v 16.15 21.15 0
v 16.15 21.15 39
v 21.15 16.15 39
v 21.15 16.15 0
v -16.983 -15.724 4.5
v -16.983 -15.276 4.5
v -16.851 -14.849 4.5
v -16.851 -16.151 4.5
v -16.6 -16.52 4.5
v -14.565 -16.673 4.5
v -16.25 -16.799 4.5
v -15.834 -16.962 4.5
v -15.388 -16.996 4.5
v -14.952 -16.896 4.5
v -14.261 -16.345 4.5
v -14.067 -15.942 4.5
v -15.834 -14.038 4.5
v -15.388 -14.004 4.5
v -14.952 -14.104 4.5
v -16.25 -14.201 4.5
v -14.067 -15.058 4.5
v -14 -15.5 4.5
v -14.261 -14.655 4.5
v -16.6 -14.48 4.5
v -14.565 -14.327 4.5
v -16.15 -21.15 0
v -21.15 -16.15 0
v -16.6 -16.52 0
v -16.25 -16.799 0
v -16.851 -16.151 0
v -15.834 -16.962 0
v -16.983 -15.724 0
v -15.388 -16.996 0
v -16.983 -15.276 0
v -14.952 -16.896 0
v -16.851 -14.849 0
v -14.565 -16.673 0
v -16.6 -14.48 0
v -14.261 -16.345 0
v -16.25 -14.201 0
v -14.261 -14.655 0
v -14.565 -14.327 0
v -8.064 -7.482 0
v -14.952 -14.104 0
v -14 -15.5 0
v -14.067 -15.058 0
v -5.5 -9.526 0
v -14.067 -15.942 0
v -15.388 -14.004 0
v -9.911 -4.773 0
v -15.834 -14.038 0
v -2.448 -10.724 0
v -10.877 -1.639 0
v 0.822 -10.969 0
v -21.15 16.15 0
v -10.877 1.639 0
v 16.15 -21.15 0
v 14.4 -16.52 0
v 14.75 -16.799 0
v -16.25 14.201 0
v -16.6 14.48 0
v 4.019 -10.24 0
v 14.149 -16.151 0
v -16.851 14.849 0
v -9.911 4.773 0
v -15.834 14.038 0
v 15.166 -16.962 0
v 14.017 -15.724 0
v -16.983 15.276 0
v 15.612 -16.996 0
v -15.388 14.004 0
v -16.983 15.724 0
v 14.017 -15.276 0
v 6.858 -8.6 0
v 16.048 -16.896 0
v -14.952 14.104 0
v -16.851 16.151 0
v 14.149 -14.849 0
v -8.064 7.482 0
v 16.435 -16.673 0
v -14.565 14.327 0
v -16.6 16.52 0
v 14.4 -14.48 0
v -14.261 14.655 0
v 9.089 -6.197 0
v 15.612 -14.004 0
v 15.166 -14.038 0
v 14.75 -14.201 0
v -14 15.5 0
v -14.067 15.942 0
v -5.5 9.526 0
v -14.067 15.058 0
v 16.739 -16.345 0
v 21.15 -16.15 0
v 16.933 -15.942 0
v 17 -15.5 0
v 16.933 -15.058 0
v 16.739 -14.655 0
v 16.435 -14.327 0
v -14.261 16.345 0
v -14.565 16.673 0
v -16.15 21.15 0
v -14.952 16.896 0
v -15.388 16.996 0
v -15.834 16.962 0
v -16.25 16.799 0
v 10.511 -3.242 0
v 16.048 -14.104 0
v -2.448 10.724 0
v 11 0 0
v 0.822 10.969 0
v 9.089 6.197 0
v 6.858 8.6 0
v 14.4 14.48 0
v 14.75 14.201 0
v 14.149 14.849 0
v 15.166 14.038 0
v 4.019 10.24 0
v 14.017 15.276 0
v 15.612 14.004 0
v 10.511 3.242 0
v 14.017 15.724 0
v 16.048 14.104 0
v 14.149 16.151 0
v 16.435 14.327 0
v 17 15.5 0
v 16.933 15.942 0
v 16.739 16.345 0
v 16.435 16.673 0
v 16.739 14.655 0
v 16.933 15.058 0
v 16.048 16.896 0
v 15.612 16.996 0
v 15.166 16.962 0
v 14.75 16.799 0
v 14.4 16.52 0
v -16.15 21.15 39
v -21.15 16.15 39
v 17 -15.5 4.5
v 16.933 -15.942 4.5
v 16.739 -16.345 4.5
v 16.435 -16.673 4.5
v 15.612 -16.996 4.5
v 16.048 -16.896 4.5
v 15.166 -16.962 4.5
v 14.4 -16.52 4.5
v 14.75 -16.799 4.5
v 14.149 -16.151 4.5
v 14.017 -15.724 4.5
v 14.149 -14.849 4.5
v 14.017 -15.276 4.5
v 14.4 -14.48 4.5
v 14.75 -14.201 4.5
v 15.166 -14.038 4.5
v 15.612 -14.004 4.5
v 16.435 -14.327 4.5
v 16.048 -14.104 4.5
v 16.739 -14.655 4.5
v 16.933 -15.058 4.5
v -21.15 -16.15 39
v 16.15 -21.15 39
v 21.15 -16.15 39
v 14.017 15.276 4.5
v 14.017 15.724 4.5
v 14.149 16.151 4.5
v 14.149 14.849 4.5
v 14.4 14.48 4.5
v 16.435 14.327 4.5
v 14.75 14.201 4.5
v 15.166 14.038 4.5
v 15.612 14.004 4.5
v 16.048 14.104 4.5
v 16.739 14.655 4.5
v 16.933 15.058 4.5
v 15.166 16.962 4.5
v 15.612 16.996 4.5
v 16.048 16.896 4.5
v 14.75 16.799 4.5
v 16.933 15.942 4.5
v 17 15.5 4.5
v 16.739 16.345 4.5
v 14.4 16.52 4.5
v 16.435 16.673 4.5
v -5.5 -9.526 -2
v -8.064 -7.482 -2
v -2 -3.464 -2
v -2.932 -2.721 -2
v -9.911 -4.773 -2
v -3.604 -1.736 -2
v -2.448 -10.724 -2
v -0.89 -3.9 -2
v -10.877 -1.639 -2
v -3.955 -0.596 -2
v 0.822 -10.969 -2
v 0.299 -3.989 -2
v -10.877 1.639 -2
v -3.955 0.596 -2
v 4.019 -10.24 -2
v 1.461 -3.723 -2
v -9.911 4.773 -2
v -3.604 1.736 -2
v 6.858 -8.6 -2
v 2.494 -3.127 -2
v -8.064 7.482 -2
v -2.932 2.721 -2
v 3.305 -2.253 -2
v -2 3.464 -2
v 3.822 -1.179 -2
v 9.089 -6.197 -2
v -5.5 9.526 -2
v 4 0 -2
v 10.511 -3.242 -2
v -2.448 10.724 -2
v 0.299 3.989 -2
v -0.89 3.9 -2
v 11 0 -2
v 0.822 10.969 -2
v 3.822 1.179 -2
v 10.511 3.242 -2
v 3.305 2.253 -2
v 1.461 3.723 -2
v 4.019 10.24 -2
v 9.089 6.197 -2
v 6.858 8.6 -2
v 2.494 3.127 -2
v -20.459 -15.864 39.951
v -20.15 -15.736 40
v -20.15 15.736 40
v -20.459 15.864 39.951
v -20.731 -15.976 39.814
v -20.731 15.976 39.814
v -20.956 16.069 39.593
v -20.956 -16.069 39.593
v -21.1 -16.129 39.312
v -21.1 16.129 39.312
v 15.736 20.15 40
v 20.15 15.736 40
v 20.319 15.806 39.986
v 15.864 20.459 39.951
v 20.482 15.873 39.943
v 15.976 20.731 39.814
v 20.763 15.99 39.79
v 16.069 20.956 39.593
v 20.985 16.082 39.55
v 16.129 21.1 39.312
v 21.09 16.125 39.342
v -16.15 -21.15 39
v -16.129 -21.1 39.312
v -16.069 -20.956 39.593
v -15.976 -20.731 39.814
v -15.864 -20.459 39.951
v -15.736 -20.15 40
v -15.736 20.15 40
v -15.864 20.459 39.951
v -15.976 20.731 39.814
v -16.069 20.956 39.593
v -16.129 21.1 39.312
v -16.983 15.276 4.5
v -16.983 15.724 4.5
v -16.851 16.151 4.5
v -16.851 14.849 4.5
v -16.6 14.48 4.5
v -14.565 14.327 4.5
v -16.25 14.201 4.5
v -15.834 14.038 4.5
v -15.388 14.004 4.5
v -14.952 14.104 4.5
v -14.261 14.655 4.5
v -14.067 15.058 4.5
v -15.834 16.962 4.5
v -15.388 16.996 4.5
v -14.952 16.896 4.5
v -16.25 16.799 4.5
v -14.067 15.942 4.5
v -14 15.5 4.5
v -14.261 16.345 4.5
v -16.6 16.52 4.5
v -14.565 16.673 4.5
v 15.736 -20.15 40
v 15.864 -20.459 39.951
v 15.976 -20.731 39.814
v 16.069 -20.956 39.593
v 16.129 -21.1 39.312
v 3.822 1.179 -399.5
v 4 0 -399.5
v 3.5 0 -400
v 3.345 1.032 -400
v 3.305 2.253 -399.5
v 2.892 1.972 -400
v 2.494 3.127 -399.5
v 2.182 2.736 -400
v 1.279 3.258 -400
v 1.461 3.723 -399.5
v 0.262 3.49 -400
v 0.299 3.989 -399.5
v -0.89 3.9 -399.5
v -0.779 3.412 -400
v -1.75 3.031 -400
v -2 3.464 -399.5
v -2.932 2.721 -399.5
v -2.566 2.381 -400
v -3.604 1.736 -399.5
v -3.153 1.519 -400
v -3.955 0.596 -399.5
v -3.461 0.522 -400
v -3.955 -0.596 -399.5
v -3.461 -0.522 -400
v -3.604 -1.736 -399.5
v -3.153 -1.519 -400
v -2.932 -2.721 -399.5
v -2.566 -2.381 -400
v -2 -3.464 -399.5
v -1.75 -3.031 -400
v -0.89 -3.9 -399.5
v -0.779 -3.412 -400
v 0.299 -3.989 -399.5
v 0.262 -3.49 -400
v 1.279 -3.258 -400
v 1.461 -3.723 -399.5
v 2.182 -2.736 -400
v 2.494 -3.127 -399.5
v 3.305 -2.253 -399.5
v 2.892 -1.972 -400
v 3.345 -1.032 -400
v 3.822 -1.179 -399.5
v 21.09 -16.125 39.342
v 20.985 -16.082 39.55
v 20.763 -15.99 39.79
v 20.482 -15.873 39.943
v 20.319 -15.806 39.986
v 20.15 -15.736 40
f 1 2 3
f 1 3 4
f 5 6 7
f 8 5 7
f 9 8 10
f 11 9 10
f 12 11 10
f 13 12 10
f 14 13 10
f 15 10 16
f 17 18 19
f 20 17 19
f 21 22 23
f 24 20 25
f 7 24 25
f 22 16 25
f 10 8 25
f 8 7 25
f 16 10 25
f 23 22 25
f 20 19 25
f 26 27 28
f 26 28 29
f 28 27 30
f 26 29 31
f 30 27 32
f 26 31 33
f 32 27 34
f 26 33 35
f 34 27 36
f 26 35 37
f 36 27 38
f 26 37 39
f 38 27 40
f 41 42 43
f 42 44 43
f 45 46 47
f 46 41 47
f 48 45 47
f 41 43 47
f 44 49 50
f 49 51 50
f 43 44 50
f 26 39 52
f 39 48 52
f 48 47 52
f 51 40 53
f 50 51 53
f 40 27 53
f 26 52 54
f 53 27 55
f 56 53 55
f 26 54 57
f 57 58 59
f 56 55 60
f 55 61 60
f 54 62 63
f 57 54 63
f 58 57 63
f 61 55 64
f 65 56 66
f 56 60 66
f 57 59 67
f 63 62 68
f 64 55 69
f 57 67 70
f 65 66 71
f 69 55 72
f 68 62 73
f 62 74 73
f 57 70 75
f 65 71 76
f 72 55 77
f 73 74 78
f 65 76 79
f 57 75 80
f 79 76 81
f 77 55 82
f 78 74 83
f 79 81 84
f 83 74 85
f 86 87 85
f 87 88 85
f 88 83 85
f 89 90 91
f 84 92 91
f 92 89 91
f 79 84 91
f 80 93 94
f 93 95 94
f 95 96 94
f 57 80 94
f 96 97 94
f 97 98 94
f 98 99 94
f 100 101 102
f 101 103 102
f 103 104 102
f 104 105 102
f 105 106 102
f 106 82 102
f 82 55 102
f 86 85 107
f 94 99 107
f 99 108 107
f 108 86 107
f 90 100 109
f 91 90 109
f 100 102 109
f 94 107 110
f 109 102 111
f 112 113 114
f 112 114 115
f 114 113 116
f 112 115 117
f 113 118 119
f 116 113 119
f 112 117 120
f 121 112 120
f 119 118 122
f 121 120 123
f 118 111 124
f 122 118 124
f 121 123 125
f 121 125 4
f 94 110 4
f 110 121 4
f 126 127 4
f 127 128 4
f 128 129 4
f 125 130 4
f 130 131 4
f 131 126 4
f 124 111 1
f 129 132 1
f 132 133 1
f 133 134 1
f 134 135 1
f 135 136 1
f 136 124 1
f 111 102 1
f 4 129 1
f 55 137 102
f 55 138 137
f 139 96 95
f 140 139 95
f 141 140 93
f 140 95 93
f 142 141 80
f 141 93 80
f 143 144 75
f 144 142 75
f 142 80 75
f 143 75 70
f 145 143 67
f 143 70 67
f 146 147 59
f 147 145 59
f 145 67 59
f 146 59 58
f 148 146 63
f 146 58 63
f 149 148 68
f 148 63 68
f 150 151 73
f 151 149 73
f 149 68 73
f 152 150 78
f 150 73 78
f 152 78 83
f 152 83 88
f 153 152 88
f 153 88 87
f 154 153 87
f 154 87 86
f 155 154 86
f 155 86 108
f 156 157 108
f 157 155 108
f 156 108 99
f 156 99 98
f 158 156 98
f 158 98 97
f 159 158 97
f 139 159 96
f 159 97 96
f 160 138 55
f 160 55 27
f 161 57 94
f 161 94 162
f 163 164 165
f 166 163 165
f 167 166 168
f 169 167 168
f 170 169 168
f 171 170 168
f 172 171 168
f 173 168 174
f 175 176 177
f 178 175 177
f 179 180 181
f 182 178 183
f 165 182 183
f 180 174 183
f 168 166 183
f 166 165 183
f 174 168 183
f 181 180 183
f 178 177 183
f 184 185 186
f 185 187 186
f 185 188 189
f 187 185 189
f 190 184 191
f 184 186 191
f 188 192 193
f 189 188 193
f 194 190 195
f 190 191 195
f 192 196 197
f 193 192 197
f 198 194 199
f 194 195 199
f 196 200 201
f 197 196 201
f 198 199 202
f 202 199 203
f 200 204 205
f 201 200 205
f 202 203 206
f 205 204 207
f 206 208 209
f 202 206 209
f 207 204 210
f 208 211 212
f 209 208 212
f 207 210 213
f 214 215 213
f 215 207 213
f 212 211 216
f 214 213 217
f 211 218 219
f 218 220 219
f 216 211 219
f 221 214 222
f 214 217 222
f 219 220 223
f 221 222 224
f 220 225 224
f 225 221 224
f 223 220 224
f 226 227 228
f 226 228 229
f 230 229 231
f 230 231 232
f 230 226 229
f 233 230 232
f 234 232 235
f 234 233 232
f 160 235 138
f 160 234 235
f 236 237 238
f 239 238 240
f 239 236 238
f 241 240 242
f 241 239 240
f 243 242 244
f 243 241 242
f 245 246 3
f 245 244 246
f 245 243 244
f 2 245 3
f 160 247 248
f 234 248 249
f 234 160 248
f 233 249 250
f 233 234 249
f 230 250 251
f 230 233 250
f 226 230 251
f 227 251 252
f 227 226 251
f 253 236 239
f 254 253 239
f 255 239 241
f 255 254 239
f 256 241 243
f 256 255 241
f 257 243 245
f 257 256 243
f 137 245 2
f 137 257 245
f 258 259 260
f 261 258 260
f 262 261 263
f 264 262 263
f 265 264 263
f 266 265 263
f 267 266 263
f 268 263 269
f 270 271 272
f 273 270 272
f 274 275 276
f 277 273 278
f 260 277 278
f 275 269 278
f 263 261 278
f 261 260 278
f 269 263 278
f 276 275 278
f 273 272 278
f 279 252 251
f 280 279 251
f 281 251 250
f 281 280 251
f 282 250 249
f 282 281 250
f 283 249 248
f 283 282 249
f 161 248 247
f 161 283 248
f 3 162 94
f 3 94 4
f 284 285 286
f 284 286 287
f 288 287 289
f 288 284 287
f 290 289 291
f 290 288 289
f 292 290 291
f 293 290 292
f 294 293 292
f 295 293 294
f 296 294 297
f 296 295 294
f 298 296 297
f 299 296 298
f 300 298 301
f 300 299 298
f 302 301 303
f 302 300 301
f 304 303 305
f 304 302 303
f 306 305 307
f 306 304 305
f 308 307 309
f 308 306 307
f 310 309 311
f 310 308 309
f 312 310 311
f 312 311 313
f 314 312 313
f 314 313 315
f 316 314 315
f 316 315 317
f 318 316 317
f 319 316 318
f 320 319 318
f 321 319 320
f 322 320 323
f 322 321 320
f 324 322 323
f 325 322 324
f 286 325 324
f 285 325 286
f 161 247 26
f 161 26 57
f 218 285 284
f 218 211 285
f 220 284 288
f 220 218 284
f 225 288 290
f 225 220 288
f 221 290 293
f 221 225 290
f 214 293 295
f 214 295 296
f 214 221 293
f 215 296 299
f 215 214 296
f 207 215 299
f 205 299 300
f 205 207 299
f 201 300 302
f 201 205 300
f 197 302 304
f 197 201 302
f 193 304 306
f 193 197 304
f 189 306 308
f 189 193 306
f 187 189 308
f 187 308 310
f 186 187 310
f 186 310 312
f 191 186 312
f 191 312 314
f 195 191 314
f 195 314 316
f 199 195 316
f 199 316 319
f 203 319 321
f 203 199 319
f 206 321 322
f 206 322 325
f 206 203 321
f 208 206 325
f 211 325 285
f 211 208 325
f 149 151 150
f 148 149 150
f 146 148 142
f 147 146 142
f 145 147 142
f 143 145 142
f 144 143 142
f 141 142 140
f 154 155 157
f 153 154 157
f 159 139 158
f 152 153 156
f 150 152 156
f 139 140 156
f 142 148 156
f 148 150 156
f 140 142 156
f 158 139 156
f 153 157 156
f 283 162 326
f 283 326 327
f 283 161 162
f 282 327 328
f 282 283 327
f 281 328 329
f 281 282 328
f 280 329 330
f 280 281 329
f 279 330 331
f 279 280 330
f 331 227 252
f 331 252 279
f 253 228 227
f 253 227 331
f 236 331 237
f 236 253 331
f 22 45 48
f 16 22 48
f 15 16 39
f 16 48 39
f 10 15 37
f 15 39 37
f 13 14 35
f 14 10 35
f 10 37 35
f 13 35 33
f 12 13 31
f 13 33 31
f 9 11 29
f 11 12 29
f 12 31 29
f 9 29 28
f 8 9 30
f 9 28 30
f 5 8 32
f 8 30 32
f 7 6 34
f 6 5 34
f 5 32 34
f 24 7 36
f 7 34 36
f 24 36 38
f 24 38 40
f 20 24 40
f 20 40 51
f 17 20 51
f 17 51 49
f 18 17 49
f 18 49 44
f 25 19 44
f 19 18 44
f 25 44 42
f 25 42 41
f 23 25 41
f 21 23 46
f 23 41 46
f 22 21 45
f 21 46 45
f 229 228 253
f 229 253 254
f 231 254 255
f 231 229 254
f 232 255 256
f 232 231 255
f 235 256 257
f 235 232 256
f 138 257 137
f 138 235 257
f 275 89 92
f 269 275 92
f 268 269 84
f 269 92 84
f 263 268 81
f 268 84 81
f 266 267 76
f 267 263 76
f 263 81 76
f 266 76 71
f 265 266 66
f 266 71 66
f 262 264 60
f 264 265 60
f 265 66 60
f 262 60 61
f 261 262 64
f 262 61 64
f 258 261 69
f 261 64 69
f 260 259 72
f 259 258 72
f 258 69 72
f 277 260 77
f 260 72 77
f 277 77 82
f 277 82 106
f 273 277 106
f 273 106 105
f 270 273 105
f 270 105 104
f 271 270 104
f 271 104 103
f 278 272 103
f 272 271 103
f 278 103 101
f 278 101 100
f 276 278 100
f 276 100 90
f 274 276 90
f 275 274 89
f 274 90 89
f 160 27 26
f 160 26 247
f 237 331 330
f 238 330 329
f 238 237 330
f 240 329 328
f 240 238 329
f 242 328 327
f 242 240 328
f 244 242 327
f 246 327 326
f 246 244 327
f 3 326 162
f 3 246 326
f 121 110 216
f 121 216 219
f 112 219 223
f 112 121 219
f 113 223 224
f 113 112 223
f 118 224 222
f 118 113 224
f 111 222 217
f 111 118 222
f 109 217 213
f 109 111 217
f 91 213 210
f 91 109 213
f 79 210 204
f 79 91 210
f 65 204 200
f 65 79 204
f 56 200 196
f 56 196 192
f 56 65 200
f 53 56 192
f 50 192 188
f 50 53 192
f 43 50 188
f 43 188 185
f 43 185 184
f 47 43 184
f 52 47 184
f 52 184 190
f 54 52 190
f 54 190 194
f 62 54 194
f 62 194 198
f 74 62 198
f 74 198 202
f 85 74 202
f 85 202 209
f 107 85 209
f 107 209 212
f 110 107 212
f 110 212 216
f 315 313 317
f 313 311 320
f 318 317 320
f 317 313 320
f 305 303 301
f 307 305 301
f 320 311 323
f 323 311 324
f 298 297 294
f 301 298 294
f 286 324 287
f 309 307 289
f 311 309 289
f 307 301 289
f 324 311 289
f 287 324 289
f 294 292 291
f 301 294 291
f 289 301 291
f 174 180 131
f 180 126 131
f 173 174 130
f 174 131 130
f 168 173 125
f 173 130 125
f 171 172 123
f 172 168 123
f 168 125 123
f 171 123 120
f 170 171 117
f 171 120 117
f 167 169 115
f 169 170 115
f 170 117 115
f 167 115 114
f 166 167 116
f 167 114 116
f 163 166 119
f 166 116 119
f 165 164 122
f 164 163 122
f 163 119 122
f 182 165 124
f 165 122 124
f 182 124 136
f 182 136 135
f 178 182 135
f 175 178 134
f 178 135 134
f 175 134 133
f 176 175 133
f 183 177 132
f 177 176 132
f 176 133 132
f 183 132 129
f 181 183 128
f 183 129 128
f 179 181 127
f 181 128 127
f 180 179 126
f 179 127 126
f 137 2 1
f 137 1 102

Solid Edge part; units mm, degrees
sketch "Sketch1" plane through (0, 0, 0) normal (0, 0, 1) x (1, 0, 0)
  line L0 (21.15, -21.15) -> (21.15, 21.15)
  line L1 (21.15, 21.15) -> (-21.15, 21.15)
  line L2 (-21.15, 21.15) -> (-21.15, -21.15)
  line L3 (-21.15, -21.15) -> (21.15, -21.15)
extrude "Protrusion1" add sketch "Sketch1" along normal blind 40
sketch "Sketch2" plane through (0, 0, 0) normal (0, 0, 1) x (1, 0, 0)
  circle A0 centre (0, 0) radius 11
extrude "ExtrudedProtrusion_2" add sketch "Sketch2" against normal blind 2
sketch "Sketch3" plane through (0, 0, 0) normal (0, 0, 1) x (1, 0, 0)
  circle A0 centre (0, 0) radius 4
extrude "ExtrudedProtrusion_3" add sketch "Sketch3" against normal blind 400
sketch "Sketch4" plane through (0, 0, 0) normal (0, 0, 1) x (1, 0, 0)
  circle A0 centre (15.5, 15.5) radius 1.5
  circle A1 centre (-15.5, 15.5) radius 1.5
  circle A2 centre (-15.5, -15.5) radius 1.5
  circle A3 centre (15.5, -15.5) radius 1.5
  dimension "D1" = 42.3
  dimension "D2" = 22
  dimension "D3" = 8
  dimension "D4" = 31
  dimension "D5" = 3
extrude "ExtrudedCutout_1" cut sketch "Sketch4" along normal blind 4.5
chamfer "Chamfer_1" distance 5 angle 45 4 edges at (21.15, 21.15, 20) (-21.15, 21.15, 20) (-21.15, -21.15, 20) (21.15, -21.15, 20)
fillet "Round_1" radius 1 8 edges at (0, 21.15, 40) (-18.65, 18.65, 40) (-21.15, 0, 40) (-18.65, -18.65, 40) (0, -21.15, 40) (18.65, -18.65, 40) (21.15, 0, 40) (18.65, 18.65, 40)
chamfer "Chamfer_2" distance 0.5 angle 45 1 edges at (-4, 0, -400)
